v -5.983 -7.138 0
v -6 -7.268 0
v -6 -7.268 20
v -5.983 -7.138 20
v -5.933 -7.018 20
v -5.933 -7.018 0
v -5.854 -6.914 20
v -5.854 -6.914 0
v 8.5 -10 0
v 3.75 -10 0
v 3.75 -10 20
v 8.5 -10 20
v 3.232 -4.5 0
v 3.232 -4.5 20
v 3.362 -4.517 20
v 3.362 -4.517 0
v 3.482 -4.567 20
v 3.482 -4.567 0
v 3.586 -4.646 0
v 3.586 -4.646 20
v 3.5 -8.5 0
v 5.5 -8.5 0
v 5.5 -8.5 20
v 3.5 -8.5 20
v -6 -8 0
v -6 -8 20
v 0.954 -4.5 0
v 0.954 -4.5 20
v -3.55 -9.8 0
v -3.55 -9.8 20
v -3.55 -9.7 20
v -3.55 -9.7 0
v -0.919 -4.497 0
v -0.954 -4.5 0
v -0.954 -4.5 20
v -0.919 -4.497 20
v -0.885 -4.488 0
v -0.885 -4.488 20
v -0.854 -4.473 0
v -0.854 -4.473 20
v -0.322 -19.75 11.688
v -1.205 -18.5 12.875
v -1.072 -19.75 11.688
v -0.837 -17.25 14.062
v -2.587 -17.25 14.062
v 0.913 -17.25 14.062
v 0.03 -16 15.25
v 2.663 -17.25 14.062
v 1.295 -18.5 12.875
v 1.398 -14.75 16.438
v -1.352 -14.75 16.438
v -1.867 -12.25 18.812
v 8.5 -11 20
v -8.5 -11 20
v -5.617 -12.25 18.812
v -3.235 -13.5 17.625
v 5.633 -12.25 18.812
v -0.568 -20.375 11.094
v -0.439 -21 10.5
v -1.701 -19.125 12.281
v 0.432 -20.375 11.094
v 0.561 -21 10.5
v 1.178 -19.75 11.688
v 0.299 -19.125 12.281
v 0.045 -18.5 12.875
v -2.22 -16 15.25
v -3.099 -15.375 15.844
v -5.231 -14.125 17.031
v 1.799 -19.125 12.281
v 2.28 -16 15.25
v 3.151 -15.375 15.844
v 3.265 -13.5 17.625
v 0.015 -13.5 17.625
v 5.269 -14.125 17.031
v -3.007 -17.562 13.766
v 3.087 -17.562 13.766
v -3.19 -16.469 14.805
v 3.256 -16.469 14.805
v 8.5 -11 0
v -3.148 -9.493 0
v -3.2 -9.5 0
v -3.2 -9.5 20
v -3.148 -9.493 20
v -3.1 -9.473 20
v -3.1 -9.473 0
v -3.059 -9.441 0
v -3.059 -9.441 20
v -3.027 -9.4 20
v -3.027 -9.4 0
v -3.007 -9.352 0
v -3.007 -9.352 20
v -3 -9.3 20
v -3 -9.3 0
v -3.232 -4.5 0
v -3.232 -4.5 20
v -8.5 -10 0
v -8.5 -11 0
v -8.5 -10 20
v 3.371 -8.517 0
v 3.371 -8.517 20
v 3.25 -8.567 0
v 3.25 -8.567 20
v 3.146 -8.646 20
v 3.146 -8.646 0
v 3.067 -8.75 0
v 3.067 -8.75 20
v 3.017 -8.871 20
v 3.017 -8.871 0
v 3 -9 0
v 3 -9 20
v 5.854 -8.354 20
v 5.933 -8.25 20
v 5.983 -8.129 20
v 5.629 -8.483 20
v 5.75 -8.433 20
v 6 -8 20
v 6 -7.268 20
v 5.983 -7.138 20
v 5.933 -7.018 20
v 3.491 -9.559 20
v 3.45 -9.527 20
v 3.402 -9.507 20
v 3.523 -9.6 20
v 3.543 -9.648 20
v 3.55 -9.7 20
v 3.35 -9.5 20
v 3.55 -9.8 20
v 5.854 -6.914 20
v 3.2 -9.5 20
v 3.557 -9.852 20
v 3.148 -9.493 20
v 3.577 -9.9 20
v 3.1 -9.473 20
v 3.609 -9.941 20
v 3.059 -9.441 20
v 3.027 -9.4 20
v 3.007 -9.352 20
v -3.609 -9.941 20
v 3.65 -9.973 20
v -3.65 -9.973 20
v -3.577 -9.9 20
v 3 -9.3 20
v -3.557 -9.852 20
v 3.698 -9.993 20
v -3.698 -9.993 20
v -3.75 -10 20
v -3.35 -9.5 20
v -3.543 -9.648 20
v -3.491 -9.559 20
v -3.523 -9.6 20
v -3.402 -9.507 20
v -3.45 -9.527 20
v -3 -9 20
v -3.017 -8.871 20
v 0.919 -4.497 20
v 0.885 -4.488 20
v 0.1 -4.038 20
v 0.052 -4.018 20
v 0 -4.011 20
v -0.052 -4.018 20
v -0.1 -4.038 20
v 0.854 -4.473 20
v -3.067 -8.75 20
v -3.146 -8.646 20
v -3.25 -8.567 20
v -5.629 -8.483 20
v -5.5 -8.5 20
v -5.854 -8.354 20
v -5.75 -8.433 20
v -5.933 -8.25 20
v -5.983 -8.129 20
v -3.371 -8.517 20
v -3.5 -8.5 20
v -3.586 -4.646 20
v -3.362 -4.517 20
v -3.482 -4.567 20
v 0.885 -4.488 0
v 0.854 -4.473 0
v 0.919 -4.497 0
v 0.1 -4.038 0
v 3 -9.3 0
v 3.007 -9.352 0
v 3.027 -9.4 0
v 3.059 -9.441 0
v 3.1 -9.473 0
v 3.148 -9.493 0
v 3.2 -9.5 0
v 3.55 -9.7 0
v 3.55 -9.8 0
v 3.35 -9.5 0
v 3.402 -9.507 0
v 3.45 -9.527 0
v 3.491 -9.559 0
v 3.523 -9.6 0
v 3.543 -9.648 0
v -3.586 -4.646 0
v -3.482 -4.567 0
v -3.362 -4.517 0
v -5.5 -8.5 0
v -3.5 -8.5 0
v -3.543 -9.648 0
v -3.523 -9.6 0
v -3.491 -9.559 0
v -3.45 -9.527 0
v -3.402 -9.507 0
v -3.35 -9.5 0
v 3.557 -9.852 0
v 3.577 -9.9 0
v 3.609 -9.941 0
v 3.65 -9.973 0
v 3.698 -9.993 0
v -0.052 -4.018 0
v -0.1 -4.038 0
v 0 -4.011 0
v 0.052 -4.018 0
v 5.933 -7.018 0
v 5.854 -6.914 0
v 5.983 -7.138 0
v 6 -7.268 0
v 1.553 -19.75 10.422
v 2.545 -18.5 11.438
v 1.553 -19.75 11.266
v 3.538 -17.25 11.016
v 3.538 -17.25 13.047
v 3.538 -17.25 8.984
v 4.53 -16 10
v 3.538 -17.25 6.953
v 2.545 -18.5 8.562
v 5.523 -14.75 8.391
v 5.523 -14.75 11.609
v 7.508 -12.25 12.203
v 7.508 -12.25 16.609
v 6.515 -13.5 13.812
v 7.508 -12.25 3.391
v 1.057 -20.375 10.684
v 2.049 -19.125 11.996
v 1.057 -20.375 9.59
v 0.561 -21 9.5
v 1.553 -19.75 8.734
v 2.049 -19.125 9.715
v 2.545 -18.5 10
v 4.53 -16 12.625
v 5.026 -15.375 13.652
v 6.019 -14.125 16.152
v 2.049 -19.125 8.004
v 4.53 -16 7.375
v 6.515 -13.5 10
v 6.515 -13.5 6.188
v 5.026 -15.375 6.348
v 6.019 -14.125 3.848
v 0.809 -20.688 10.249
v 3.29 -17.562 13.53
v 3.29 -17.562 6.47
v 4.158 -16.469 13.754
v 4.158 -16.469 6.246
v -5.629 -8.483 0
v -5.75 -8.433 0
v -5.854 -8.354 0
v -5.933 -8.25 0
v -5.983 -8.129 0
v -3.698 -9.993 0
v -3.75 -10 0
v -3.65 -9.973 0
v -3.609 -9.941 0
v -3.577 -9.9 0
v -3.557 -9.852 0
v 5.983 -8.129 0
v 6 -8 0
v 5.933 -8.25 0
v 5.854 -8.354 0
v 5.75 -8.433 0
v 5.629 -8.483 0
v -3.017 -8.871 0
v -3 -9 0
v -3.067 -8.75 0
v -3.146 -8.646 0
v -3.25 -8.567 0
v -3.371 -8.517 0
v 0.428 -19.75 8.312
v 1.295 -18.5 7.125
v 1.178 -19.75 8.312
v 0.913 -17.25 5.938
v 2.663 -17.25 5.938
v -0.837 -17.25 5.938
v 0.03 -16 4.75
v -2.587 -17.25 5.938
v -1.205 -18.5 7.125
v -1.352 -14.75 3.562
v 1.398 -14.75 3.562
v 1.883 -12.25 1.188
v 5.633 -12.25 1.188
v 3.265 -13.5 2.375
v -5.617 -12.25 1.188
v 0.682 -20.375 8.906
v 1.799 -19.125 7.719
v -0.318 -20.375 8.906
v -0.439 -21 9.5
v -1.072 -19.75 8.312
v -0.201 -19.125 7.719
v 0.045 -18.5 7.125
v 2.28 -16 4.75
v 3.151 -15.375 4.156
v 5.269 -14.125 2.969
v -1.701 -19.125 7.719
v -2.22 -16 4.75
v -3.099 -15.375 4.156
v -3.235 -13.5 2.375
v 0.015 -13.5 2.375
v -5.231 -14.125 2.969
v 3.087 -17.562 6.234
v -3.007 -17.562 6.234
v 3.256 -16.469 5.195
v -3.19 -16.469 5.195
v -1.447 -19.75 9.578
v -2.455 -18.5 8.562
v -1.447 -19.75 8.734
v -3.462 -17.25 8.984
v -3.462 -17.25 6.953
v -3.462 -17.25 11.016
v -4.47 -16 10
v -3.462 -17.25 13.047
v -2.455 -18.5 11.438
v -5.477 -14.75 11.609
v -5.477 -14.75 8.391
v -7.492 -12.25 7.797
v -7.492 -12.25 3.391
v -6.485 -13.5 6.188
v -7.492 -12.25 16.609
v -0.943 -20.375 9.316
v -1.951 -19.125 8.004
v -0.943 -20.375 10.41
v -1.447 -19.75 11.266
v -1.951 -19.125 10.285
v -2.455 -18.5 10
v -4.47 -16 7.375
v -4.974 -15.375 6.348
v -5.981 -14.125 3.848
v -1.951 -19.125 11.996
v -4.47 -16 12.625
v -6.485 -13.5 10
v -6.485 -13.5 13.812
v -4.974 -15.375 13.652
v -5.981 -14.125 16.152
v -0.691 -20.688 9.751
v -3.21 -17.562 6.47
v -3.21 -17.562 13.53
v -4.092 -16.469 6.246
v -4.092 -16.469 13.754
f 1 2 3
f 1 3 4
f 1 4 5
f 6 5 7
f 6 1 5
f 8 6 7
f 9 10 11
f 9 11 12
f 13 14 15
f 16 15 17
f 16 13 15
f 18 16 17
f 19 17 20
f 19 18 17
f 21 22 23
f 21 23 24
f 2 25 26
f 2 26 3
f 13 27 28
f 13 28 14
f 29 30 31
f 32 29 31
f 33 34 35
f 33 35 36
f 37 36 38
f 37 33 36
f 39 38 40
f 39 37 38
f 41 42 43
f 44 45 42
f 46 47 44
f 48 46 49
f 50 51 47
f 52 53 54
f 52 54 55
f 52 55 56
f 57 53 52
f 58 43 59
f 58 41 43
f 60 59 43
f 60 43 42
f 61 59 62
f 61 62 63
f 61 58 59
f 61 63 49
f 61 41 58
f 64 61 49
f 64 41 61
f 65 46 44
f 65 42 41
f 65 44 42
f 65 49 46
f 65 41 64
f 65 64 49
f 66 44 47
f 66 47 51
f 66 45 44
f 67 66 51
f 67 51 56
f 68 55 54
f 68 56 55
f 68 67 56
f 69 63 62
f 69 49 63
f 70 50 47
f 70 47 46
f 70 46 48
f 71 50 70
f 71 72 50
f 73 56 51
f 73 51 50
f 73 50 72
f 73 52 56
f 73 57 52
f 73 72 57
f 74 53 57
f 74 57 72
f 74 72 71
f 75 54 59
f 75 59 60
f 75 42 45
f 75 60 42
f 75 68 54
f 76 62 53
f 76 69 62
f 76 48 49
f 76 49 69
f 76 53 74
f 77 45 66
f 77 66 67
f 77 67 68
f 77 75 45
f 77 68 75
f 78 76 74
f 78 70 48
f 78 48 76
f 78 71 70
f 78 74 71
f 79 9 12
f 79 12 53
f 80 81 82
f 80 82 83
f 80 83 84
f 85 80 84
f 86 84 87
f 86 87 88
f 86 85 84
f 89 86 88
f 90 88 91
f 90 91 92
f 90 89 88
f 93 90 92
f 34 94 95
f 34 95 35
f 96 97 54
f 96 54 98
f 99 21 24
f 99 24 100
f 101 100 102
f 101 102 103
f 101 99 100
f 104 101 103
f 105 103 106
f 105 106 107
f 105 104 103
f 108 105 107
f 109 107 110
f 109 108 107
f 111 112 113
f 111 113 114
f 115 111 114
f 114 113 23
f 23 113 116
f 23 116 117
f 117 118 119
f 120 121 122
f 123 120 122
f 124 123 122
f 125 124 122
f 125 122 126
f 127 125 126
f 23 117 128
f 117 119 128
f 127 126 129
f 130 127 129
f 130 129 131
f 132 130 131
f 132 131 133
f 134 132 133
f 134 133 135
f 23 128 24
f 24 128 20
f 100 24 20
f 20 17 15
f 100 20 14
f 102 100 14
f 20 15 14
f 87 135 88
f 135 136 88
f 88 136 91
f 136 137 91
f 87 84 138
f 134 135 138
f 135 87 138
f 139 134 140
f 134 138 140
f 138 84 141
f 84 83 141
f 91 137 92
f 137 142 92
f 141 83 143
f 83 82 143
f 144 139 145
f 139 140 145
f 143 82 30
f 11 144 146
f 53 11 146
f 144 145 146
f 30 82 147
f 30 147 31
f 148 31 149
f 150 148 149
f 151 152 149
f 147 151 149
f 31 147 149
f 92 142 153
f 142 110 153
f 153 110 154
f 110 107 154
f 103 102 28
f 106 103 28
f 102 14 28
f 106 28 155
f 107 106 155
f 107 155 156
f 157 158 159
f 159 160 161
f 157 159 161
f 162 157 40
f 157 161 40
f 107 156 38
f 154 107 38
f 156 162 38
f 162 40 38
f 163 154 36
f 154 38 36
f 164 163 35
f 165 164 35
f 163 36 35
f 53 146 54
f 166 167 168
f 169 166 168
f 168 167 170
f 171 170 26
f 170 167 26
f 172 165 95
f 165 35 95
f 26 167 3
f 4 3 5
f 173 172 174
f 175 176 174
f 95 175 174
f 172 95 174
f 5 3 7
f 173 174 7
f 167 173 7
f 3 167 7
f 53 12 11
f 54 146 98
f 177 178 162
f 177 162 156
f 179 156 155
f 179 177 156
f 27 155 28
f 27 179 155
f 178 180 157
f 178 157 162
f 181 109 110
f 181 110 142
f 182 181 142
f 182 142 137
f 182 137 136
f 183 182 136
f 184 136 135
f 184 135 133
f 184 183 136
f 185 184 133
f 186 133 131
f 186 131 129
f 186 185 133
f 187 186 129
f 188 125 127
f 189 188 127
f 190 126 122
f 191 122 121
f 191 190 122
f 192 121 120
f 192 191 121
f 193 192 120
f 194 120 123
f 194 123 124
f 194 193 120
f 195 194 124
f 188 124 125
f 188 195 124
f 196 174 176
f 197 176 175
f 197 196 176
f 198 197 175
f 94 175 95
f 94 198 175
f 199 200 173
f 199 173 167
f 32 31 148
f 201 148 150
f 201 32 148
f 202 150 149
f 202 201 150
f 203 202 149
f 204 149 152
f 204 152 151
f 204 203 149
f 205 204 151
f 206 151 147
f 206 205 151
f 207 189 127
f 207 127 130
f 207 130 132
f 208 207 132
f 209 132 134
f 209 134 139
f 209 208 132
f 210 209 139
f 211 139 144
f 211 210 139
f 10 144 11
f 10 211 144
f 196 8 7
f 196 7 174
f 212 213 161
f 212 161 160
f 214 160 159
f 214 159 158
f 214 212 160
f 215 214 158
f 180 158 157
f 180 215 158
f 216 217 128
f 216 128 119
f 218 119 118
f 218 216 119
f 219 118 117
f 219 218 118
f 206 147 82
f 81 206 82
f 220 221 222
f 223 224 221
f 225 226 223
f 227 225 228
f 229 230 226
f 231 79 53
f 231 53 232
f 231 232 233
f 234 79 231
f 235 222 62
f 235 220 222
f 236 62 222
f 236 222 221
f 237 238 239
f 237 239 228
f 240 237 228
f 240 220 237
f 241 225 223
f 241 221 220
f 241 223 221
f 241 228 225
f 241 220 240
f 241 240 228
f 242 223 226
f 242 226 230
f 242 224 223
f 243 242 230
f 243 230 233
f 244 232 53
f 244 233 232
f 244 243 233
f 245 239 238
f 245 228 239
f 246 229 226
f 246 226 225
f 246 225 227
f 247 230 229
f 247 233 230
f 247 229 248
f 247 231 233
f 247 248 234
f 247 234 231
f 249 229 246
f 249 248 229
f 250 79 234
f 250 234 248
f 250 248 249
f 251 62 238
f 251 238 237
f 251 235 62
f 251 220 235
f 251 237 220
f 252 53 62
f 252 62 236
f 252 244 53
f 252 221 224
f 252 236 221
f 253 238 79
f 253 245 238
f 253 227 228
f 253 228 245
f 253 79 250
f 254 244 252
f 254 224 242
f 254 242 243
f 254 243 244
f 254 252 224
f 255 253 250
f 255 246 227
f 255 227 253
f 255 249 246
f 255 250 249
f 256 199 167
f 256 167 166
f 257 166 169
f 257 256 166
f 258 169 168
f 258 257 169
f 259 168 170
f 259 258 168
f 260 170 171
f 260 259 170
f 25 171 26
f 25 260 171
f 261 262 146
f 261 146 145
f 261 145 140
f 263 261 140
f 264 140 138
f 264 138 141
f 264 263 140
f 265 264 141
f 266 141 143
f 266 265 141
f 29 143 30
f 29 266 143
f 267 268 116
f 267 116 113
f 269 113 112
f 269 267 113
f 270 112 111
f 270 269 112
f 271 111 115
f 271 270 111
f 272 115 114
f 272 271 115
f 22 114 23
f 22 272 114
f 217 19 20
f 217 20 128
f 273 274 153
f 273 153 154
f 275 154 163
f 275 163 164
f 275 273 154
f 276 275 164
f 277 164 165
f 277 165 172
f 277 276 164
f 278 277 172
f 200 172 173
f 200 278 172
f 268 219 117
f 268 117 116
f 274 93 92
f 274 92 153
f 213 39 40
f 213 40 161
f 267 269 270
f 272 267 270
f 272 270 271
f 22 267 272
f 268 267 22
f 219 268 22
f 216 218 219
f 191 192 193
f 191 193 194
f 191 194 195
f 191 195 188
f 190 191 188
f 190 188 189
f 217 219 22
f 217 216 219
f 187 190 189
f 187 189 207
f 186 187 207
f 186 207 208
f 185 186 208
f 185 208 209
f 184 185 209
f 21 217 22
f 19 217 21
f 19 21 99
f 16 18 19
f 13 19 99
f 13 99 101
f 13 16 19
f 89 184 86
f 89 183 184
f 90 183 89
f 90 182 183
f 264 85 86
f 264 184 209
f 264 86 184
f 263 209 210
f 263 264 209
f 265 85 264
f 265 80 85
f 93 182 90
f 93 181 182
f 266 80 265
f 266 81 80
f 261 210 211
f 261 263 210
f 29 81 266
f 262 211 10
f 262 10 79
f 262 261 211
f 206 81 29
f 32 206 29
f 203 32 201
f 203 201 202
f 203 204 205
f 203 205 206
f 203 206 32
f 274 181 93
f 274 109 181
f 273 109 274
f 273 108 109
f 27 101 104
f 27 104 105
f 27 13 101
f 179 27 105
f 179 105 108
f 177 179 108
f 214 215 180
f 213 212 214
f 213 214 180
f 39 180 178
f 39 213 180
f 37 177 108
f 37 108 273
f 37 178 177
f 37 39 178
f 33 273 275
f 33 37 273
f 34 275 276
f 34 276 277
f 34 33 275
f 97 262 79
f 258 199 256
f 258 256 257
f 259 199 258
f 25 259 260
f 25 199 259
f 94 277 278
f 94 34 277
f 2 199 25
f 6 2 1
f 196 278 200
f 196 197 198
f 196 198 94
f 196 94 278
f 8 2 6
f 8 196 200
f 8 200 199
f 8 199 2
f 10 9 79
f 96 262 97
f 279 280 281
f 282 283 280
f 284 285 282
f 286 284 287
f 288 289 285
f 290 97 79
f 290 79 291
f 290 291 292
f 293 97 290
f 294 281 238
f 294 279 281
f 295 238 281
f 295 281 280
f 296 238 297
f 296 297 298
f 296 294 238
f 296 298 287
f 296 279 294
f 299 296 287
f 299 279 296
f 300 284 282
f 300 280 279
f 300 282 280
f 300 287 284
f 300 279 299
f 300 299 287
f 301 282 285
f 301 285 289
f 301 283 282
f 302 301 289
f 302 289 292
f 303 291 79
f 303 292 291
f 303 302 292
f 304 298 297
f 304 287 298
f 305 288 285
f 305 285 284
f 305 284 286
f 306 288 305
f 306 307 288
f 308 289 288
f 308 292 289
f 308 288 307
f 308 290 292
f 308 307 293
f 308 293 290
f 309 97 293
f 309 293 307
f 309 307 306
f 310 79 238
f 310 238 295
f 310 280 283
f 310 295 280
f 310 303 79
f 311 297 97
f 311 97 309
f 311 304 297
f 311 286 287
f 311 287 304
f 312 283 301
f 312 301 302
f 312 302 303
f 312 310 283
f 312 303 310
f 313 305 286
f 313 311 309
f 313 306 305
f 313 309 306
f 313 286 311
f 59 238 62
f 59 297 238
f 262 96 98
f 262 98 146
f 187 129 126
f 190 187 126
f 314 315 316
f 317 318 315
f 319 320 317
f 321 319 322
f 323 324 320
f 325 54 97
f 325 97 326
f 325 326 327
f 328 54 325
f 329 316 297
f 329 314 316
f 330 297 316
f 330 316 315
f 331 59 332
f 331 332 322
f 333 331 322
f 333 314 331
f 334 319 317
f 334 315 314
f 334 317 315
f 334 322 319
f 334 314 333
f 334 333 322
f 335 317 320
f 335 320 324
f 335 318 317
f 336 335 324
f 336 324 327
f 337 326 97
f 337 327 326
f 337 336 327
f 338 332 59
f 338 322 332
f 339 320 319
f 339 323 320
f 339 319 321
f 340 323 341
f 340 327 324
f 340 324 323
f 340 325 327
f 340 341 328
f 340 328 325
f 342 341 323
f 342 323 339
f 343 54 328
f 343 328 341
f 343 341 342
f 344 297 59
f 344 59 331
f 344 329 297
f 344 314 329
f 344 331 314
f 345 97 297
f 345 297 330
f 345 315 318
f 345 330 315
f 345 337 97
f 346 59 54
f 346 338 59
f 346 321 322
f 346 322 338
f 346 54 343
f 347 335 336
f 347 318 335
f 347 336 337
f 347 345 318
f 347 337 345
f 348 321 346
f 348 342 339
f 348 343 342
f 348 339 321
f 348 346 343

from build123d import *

# Parameters (mm, degrees)
BOSS_EXTRUDE1_DEPTH = 20


with BuildPart() as part:
    # Sketch3 → Boss-Extrude1 (new body)
    with BuildSketch(Plane.XY):
        with BuildLine():
            Line((3.750000228, -10), (8.5, -10))
            Line((8.5, -10), (8.5, -11))
            Line((8.5, -11), (-8.5, -11))
            Line((-8.5, -11), (-8.5, -10))
            Line((-8.5, -10), (-3.750000228, -10))
            ThreePointArc((-3.750000228, -10), (-3.608578871, -9.941421356), (-3.550000228, -9.8))
            Line((-3.550000228, -9.8), (-3.550000228, -9.7))
            ThreePointArc((-3.550000228, -9.7), (-3.491421584, -9.558578644), (-3.350000228, -9.5))
            Line((-3.350000228, -9.5), (-3.2, -9.5))
            ThreePointArc((-3.2, -9.5), (-3.058578644, -9.441421356), (-3, -9.3))
            Line((-3, -9.3), (-3, -8.999999673))
            ThreePointArc((-3, -8.999999673), (-3.146446609, -8.646446283), (-3.5, -8.499999673))
            Line((-3.5, -8.499999673), (-5.500000686, -8.499999673))
            ThreePointArc((-5.500000686, -8.499999673), (-5.853554077, -8.353553064), (-6.000000686, -7.999999673))
            Line((-6.000000686, -7.999999673), (-6.000000686, -7.267766626))
            ThreePointArc((-6.000000686, -7.267766626), (-5.961940448, -7.076424899), (-5.853554059, -6.914213219))
            Line((-5.853554059, -6.914213219), (-3.585787212, -4.646446592))
            ThreePointArc((-3.585787212, -4.646446592), (-3.423575544, -4.538060229), (-3.232233839, -4.5))
            Line((-3.232233839, -4.5), (-0.953590312, -4.5))
            ThreePointArc((-0.953590312, -4.5), (-0.901826505, -4.493185166), (-0.853590316, -4.473205083))
            Line((-0.853590316, -4.473205083), (-0.100000045, -4.038119562))
            ThreePointArc((-0.100000045, -4.038119562), (0, -4.011324632), (0.100000045, -4.038119562))
            Line((0.100000045, -4.038119562), (0.853590316, -4.473205083))
            ThreePointArc((0.853590316, -4.473205083), (0.901826505, -4.493185166), (0.953590312, -4.5))
            Line((0.953590312, -4.5), (3.232233839, -4.5))
            ThreePointArc((3.232233839, -4.5), (3.423575544, -4.538060229), (3.585787212, -4.646446592))
            Line((3.585787212, -4.646446592), (5.853554059, -6.914213219))
            ThreePointArc((5.853554059, -6.914213219), (5.961940448, -7.076424899), (6.000000686, -7.267766626))
            Line((6.000000686, -7.267766626), (6.000000686, -7.999999673))
            ThreePointArc((6.000000686, -7.999999673), (5.853554077, -8.353553064), (5.500000686, -8.499999673))
            Line((5.500000686, -8.499999673), (3.5, -8.499999673))
            ThreePointArc((3.5, -8.499999673), (3.146446609, -8.646446283), (3, -8.999999673))
            Line((3, -8.999999673), (3, -9.3))
            ThreePointArc((3, -9.3), (3.058578644, -9.441421356), (3.2, -9.5))
            Line((3.2, -9.5), (3.350000228, -9.5))
            ThreePointArc((3.350000228, -9.5), (3.491421584, -9.558578644), (3.550000228, -9.7))
            Line((3.550000228, -9.7), (3.550000228, -9.8))
            ThreePointArc((3.550000228, -9.8), (3.608578871, -9.941421356), (3.750000228, -10))
        make_face()
    extrude(amount=BOSS_EXTRUDE1_DEPTH)

    # Çizim2 → section 0 of loft1
    with BuildSketch(Plane(origin=(0, -21, 0), x_dir=(-1, 0, 0), z_dir=(0, -1, 0)), mode=Mode.PRIVATE) as loft1_s0:
        with BuildLine():
            Line((-0.560549313, -9.5), (0.439450687, -9.5))
            Line((0.439450687, -9.5), (0.439450687, -10.5))
            Line((0.439450687, -10.5), (-0.560549313, -10.5))
            Line((-0.560549313, -10.5), (-0.560549313, -9.5))
        make_face()
    # loft up to a face of the part (loft1)
    loft([loft1_s0.sketch, part.faces().sort_by_distance((0, -11, 10))[0]])


solid = part.part
